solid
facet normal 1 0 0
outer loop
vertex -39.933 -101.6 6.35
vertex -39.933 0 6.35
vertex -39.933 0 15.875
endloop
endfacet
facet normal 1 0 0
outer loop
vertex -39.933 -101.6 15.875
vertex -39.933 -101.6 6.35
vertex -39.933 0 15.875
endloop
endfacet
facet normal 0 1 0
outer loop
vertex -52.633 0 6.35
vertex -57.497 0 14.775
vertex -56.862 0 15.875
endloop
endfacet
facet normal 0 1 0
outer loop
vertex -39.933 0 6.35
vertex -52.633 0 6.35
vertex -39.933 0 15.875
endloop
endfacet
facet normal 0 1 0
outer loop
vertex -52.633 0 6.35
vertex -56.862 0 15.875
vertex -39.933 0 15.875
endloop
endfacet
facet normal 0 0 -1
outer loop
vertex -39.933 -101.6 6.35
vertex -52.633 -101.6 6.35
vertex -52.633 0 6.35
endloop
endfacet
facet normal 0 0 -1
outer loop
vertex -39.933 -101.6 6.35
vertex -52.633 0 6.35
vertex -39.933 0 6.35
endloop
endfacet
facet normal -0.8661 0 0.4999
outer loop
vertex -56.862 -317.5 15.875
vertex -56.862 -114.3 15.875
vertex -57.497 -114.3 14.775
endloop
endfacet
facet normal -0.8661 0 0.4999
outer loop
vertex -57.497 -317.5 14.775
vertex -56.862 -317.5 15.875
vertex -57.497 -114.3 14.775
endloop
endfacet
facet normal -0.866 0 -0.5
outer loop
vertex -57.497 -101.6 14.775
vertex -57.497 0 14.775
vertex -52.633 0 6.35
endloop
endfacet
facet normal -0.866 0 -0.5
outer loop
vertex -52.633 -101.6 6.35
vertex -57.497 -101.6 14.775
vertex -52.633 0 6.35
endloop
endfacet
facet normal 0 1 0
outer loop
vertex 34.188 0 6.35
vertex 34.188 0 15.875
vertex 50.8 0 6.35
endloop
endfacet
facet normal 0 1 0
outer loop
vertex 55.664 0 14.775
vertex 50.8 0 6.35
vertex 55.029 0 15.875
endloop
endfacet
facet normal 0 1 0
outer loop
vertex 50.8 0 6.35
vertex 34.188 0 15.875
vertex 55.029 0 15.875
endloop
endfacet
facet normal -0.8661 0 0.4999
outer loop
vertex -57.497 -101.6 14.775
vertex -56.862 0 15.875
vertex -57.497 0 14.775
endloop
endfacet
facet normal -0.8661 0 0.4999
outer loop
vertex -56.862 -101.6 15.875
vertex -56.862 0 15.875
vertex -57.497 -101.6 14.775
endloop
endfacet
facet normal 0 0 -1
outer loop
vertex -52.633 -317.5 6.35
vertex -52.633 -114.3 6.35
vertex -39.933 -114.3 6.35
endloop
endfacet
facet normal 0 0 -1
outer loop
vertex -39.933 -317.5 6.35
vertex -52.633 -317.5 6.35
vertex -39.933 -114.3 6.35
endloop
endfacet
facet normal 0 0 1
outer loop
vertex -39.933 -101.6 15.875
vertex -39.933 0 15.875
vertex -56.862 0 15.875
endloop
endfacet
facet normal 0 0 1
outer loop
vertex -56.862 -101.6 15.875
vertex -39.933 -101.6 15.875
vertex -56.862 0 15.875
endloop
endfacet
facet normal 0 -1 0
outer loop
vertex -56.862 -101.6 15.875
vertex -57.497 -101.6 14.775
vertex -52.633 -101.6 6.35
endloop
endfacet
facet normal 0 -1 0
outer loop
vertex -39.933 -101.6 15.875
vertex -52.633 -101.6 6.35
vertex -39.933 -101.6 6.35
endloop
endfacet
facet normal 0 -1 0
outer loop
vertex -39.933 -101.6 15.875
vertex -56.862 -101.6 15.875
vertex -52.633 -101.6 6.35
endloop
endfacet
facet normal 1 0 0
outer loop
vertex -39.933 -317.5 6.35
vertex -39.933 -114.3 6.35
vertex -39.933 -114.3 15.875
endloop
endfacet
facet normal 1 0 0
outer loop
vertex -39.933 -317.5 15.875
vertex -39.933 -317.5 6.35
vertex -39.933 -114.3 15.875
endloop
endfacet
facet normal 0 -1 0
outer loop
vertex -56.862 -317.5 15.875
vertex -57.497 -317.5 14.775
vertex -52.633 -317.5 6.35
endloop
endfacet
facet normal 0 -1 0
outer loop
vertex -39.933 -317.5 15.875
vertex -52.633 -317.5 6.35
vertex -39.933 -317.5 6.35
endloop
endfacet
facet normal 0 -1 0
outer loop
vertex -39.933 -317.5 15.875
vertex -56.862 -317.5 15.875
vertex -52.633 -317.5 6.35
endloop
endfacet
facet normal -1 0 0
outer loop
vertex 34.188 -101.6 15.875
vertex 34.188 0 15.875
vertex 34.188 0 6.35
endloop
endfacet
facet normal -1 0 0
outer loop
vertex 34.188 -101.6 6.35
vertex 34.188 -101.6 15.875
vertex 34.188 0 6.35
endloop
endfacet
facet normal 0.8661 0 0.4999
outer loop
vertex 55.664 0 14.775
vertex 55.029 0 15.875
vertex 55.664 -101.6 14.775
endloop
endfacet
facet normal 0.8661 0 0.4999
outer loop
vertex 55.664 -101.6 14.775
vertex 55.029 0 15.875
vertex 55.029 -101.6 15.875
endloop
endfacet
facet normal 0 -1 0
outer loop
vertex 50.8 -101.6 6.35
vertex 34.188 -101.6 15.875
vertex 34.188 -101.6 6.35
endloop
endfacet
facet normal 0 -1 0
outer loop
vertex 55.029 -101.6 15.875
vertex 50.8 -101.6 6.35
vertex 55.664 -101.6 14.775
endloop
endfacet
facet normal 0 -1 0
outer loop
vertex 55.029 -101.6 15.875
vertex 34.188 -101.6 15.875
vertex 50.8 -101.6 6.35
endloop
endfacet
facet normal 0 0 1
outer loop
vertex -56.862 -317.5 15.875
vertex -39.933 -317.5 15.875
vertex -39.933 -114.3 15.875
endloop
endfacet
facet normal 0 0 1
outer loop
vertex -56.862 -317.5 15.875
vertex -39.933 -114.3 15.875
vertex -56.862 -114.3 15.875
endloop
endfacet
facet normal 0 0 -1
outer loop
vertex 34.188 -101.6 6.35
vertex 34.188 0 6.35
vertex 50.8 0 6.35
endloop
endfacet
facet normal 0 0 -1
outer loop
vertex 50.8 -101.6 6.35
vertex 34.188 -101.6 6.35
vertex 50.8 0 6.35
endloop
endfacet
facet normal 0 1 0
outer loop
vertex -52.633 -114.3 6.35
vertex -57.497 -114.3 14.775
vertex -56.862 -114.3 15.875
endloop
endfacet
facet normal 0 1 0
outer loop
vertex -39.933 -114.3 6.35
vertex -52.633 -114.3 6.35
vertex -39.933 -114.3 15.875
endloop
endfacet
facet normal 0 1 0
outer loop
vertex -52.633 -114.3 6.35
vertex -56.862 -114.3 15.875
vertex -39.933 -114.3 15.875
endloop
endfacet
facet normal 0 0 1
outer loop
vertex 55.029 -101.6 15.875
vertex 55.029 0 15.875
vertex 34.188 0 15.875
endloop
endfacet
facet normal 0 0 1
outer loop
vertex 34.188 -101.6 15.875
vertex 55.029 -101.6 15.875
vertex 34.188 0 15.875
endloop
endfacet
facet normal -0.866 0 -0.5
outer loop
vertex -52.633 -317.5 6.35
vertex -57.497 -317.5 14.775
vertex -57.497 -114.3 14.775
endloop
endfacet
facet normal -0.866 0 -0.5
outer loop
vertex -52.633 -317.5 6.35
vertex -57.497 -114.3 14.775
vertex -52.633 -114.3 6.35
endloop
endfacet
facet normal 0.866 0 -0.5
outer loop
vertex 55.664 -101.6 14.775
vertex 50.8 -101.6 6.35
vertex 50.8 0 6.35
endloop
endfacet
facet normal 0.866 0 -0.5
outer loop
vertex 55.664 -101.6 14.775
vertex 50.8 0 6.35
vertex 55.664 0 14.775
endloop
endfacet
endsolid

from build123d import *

# Parameters (mm, degrees)
F1_DEPTH   = 101.6
F2_DEPTH   = 101.6
F3_SIZE2   = 1.27
F3_SIZE    = 1.27
F3_2_SIZE2 = 1.27
F3_2_SIZE  = 1.27
F6_DEPTH   = 203.2


with BuildPart() as f1:
    # F0 (on Front) → F1 (new body)
    with BuildSketch(Plane.XZ):
        Polygon((-58.1323484187, 15.875), (-52.6330871047, 6.35), (-39.9330871047, 6.35), (-39.9330871047, 15.875), align=None)
    extrude(amount=F1_DEPTH)

    # F3
    f3_edges = [f1.edges().sort_by_distance(p)[0] for p in [
        (-58.132348, -50.8, 15.875),
    ]]
    chamfer(f3_edges, length=F3_SIZE, length2=F3_SIZE2)


with BuildPart() as f2:
    # F0 (on Front) → F2 (new body)
    with BuildSketch(Plane.XZ):
        Polygon((34.1884, 6.35), (50.8, 6.35), (56.299261314, 15.875), (34.1884, 15.875), align=None)
    extrude(amount=F2_DEPTH)

    # F3#2
    f3_2_edges = [f2.edges().sort_by_distance(p)[0] for p in [
        (56.299261, -50.8, 15.875),
    ]]
    chamfer(f3_2_edges, length=F3_2_SIZE, length2=F3_2_SIZE2)


with BuildPart() as f6:
    # F5 (on offset) → F6 (new body)
    with BuildSketch(Plane.XZ.offset(114.3)):
        Polygon((-39.9330871047, 6.35), (-39.9330871047, 15.875), (-56.8623484187, 15.875), (-57.4973484187, 14.7751477372), (-52.6330871047, 6.35), align=None)
    extrude(amount=F6_DEPTH)


solid = Compound([f1.part, f2.part, f6.part])
